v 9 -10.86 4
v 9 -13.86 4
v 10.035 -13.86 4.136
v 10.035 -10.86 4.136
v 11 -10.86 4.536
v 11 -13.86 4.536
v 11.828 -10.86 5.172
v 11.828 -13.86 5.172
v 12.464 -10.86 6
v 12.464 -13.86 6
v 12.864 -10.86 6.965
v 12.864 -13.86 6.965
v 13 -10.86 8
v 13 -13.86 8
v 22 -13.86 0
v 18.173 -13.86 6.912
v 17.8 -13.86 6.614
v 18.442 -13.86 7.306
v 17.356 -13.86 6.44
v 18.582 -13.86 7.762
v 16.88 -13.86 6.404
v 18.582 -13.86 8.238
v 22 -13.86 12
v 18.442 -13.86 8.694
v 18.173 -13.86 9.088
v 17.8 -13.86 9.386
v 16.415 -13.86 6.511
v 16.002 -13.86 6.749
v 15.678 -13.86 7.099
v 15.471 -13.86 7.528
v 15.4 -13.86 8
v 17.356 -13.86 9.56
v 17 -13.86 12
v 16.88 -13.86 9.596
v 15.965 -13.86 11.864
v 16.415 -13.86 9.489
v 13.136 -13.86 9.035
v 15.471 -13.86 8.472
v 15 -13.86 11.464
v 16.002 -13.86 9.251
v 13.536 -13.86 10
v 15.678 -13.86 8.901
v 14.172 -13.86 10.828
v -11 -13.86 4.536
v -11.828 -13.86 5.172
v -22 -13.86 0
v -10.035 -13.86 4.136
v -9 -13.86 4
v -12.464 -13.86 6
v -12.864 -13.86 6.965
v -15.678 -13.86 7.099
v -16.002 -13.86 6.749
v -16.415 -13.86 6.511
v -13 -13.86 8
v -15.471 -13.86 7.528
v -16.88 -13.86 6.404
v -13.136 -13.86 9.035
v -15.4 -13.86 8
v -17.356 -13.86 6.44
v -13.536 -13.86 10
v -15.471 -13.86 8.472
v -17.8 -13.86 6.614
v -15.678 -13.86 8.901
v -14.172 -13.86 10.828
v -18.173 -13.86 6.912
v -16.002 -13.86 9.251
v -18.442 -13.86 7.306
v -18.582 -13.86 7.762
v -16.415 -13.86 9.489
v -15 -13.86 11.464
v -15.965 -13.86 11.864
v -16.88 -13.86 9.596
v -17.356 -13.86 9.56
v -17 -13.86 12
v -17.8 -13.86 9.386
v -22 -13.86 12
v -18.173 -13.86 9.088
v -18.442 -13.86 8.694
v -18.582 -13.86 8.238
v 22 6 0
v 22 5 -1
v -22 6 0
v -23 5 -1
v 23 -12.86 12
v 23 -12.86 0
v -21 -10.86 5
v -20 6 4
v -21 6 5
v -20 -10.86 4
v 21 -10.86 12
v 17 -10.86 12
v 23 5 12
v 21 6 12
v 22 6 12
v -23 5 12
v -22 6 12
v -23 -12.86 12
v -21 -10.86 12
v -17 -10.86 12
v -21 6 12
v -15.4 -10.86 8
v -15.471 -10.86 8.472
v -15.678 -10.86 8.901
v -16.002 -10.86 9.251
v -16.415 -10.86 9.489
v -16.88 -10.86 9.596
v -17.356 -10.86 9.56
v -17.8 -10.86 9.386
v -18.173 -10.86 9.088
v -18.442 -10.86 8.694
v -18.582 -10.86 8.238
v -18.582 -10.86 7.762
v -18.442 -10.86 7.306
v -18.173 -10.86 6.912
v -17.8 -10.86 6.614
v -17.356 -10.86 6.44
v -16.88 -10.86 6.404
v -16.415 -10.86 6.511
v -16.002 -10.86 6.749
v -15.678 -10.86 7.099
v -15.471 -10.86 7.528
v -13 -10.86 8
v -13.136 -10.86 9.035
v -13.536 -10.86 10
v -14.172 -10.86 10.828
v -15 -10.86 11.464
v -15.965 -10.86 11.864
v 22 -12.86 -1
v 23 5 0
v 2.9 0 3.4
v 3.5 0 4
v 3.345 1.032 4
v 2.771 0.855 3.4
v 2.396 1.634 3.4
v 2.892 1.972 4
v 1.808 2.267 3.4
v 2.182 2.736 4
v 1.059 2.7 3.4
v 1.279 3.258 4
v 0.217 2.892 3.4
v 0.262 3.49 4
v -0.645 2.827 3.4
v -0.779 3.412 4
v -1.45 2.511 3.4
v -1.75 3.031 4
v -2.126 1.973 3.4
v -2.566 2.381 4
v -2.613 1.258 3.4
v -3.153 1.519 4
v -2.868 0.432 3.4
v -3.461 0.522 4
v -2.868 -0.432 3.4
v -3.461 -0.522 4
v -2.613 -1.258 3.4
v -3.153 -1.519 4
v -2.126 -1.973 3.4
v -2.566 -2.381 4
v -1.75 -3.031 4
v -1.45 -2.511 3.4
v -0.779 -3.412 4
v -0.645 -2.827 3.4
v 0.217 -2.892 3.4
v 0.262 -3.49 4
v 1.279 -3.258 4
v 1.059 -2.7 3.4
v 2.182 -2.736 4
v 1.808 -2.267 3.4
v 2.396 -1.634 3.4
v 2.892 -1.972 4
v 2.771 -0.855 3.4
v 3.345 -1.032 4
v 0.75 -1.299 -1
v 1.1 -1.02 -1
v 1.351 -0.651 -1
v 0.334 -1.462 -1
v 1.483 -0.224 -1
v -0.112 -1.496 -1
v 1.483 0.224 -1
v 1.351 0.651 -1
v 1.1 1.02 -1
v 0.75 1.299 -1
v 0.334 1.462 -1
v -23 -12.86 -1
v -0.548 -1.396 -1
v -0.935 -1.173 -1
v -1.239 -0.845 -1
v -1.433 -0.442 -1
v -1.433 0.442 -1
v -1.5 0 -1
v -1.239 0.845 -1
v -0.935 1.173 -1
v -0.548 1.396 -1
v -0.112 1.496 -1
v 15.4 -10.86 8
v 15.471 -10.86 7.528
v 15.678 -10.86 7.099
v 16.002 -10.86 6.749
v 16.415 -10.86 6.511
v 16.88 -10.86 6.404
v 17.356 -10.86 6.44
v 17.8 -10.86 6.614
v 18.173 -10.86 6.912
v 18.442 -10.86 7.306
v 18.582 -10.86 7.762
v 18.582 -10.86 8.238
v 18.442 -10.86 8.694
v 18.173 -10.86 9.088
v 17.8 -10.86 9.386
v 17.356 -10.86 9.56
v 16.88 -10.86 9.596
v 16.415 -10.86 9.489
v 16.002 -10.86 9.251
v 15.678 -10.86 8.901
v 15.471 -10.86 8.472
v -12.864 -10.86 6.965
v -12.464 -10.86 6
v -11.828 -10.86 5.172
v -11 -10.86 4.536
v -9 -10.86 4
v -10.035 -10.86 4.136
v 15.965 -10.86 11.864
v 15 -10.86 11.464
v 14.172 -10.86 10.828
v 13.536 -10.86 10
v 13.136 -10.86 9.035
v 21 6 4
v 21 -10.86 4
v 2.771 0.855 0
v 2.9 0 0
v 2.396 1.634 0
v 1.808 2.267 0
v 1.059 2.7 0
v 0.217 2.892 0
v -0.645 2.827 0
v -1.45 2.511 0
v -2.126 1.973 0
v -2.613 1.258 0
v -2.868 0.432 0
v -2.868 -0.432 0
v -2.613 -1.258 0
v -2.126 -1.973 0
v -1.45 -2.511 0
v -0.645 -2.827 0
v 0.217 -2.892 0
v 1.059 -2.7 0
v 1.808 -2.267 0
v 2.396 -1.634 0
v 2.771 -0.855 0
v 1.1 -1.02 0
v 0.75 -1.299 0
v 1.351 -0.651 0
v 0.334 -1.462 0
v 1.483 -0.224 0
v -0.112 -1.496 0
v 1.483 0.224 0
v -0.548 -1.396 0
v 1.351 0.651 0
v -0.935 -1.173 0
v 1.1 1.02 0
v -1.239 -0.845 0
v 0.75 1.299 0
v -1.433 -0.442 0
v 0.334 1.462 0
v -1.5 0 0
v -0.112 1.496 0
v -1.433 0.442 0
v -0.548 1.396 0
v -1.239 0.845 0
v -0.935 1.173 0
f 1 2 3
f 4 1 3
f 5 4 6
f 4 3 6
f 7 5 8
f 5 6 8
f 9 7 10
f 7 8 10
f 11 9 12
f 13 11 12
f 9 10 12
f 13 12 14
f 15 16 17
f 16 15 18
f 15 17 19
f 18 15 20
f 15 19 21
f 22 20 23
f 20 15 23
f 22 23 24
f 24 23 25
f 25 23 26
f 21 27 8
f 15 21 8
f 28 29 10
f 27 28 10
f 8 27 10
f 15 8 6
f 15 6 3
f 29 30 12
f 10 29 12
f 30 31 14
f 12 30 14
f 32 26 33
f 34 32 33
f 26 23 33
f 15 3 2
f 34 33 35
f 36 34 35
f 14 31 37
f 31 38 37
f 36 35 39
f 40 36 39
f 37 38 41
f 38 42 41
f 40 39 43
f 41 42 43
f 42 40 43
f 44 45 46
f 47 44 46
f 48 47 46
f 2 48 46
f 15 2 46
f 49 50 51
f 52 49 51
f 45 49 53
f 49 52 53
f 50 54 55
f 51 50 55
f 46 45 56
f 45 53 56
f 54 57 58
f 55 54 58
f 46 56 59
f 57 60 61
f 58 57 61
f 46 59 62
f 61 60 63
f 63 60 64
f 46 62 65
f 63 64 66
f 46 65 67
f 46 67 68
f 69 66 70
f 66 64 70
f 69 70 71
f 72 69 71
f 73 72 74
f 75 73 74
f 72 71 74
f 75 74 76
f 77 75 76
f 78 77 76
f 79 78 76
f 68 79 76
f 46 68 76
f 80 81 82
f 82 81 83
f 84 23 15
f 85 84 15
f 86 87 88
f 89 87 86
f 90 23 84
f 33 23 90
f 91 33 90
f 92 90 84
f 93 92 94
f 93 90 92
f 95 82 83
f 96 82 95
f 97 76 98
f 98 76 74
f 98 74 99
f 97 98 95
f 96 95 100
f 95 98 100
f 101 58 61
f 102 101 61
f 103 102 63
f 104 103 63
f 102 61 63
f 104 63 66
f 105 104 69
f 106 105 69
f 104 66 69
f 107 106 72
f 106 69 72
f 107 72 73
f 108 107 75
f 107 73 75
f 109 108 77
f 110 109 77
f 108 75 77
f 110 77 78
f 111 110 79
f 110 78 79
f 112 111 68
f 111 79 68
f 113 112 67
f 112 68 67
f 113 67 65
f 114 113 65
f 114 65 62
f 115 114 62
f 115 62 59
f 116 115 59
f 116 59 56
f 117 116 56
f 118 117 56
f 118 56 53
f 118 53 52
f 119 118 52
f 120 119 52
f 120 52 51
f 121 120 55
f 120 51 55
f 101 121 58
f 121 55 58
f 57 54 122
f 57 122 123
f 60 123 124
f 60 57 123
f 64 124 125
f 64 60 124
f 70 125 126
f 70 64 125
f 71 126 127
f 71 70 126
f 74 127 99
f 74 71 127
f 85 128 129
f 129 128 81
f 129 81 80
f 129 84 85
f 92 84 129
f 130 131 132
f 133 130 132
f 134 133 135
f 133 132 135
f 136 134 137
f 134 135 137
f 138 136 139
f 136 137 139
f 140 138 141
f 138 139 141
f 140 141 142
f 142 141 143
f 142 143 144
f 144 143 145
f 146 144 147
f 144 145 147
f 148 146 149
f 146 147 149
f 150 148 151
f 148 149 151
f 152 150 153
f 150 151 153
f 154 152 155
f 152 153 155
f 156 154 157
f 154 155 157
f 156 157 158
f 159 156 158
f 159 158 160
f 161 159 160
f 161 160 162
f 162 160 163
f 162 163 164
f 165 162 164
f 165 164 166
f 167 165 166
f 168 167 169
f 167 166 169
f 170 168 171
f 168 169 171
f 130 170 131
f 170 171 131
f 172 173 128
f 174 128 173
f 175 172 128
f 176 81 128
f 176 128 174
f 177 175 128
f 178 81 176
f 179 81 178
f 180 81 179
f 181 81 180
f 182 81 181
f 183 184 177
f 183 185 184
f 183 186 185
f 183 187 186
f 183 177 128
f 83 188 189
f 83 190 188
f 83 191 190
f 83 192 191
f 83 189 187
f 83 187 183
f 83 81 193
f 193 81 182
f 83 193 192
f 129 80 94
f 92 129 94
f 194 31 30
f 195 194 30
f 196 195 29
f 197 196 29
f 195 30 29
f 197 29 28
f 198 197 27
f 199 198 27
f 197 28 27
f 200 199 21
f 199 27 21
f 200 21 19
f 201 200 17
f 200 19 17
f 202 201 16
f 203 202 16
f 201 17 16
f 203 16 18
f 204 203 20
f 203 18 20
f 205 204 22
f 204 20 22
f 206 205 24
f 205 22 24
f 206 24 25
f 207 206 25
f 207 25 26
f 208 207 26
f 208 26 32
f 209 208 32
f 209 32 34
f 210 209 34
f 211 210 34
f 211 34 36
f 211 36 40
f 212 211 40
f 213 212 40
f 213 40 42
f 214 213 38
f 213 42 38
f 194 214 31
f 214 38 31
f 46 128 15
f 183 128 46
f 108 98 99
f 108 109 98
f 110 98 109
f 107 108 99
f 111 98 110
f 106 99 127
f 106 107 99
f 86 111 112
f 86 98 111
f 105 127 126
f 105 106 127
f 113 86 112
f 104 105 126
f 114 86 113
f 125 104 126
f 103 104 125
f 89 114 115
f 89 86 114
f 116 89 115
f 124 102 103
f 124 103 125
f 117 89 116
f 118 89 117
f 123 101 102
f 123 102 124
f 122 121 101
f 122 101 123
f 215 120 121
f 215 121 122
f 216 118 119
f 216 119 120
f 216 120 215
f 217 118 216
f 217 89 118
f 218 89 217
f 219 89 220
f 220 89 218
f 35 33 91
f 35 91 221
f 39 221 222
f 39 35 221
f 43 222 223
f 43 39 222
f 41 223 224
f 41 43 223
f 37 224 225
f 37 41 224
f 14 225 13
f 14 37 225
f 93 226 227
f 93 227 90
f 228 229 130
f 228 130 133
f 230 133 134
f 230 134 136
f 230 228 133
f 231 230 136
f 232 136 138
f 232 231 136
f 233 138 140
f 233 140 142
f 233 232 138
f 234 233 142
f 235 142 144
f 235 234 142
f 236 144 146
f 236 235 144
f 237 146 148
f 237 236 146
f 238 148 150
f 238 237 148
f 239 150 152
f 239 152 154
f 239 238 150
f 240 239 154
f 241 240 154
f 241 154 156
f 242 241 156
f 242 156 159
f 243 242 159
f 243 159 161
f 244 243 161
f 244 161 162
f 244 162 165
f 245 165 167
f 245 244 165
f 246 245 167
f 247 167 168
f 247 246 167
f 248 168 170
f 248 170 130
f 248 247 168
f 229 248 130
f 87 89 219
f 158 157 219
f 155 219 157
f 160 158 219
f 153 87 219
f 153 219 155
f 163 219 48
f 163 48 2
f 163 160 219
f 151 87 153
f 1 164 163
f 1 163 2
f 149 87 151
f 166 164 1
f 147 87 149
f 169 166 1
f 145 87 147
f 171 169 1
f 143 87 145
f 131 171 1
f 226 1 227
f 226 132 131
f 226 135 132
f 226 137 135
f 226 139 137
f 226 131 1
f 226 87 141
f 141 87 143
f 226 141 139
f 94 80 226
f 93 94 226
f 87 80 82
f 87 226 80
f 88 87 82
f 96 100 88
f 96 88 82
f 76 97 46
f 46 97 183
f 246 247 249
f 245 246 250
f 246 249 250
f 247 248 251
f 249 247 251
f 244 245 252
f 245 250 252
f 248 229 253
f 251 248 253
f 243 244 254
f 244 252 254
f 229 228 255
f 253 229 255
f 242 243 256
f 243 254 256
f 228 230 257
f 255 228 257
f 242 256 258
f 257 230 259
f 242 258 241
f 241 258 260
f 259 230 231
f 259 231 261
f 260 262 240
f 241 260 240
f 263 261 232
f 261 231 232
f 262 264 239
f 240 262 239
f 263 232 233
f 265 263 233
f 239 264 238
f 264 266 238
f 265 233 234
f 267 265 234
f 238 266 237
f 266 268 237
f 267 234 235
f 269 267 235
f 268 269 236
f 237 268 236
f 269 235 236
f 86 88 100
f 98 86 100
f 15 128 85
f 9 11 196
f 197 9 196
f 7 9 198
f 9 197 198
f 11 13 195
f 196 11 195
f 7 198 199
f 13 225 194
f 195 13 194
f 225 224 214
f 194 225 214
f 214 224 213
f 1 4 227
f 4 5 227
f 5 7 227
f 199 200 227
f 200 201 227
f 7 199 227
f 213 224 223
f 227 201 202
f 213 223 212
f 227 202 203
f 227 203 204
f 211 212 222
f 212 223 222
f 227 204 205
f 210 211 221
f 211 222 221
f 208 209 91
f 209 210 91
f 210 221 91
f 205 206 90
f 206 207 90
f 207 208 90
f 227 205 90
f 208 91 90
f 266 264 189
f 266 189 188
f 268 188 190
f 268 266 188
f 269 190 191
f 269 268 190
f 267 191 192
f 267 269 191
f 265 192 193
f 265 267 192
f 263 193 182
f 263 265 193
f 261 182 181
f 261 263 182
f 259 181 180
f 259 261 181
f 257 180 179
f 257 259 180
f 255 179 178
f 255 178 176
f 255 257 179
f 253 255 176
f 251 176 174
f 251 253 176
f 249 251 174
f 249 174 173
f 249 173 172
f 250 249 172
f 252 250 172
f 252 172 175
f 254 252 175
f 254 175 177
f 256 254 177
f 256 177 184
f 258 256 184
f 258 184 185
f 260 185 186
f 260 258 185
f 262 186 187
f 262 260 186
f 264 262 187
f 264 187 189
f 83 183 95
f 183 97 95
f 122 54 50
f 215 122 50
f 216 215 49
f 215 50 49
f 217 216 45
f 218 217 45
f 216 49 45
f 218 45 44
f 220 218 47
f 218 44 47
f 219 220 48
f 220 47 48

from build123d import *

# Parameters (mm, degrees)
SKETCH_1_R       = 2.9
EXTRUDE_1_DEPTH  = 4
CHAMFER_1_SIZE   = 0.6
SKETCH_3_W       = 12
SKETCH_3_H       = 19.86
EXTRUDE_2_DEPTH  = 2
SKETCH_4_W       = 10
SKETCH_4_H       = 12
SKETCH_4_R       = 1.6
EXTRUDE_3_DEPTH  = 3
FILLET_START     = -15
FILLET_2_DEPTH   = 4.14
FILLET_START_2   = -13.86
FILLET_2_2_DEPTH = 3
SKETCH_5_W       = 46
SKETCH_5_H       = 19.86
SKETCH_5_R       = 1.5
EXTRUDE_4_DEPTH  = 1
CHAMFER_4_SIZE   = 1


with BuildPart() as part:
    # 草图1 → 凸台-拉伸1 (new body)
    with BuildSketch(Plane.XY):
        Polygon((7.937253933, 6), (-21, 6), (-21, -13.86), (7.937253933, -13.86), (21, -13.86), (21, 6), align=None)
        Circle(SKETCH_1_R, mode=Mode.SUBTRACT)
    extrude(amount=EXTRUDE_1_DEPTH)

    # 倒角1
    chamfer_1_edges = [part.edges().sort_by_distance(p)[0] for p in [
        (-2.9, 0, 4),
    ]]
    chamfer(chamfer_1_edges, length=CHAMFER_1_SIZE)

    # 草图3 → 凸台-拉伸2 (add)
    with BuildSketch(Plane.ZY.offset(21)):
        with Locations((6, -3.93)):
            Rectangle(SKETCH_3_W, SKETCH_3_H)
    extrude_2 = extrude(amount=EXTRUDE_2_DEPTH)

    # 镜向1: 凸台-拉伸2 across plane
    add(extrude_2.mirror(Plane(origin=(0, 0, 0), x_dir=(0, 0, 1), z_dir=(1, 0, 0))))

    # 草图4 → 凸台-拉伸3 (add)
    # profile 1 of 2: a face of its own
    with BuildSketch(Plane.XZ.offset(13.86)):
        with Locations((-18, 6)):
            Rectangle(SKETCH_4_W, SKETCH_4_H)
        with Locations((-17, 8)):
            Circle(SKETCH_4_R, mode=Mode.SUBTRACT)
    # profile 2 of 2: a face of its own
    with BuildSketch(Plane.XZ.offset(13.86)):
        with Locations((18, 6)):
            Rectangle(SKETCH_4_W, SKETCH_4_H)
        with Locations(Location((17, 8, 0), (0, 0, 180))):
            Circle(SKETCH_4_R, mode=Mode.SUBTRACT)
    extrude(amount=-EXTRUDE_3_DEPTH)

    # 圆角2: read off the stored shape, not the designer's step
    # 圆角2 outline → 圆角2 (cut)
    with BuildSketch(Plane(origin=(0, 0, 0), x_dir=(1, 0, 0), z_dir=(0, 1, 0)).offset(FILLET_START)):
        with BuildLine():
            Line((13, -12), (17, -12))
            ThreePointArc((17, -12), (14.171572875, -10.828427125), (13, -8))
            Line((13, -8), (13, -12))
        make_face()
        with BuildLine():
            Line((-13, -12), (-13, -8))
            ThreePointArc((-13, -8), (-14.171572875, -10.828427125), (-17, -12))
            Line((-17, -12), (-13, -12))
        make_face()
    extrude(amount=FILLET_2_DEPTH, mode=Mode.SUBTRACT)

    # Fillet 2 2 outline → Fillet 2 2 (add)
    with BuildSketch(Plane(origin=(0, 0, 0), x_dir=(1, 0, 0), z_dir=(0, 1, 0)).offset(FILLET_START_2)):
        with BuildLine():
            ThreePointArc((-13, -8), (-11.828427125, -5.171572875), (-9, -4))
            Line((-9, -4), (-13, -4))
            Line((-13, -4), (-13, -8))
        make_face()
        with BuildLine():
            ThreePointArc((9, -4), (11.828427125, -5.171572875), (13, -8))
            Line((13, -8), (13, -4))
            Line((13, -4), (9, -4))
        make_face()
    extrude(amount=FILLET_2_2_DEPTH)

    # 草图5 → 凸台-拉伸4 (add)
    with BuildSketch(Plane(origin=(0, 0, 0), x_dir=(-1, 0, 0), z_dir=(0, 0, -1))):
        with Locations((0, -3.93)):
            Rectangle(SKETCH_5_W, SKETCH_5_H)
        Circle(SKETCH_5_R, mode=Mode.SUBTRACT)
    extrude(amount=EXTRUDE_4_DEPTH)

    # 倒角4
    chamfer_4_edges = [part.edges().sort_by_distance(p)[0] for p in [
        (0, 6, -1),
        (23, -3.93, -1),
        (0, -13.86, -1),
        (-23, 6, 5.5),
        (-23, -13.86, 5.5),
        (23, -13.86, 5.5),
        (23, 6, 5.5),
        (-21, -2.43, 4),
    ]]
    chamfer(chamfer_4_edges, length=CHAMFER_4_SIZE)


solid = part.part
